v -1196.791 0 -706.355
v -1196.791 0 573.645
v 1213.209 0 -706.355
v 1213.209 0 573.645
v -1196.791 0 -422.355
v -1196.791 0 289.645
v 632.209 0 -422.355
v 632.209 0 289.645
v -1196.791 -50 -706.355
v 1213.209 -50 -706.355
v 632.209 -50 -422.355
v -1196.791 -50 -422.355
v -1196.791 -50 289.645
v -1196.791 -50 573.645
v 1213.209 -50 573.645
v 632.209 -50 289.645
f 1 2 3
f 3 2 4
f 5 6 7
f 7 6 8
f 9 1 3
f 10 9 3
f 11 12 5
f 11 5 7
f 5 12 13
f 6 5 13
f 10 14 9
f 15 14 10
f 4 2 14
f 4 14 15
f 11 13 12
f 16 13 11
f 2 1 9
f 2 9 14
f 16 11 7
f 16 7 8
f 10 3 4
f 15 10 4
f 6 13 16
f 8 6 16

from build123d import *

# Parameters (mm, degrees)
F0_W     = 2410
F0_H     = 1280
F1_DEPTH = 50
F2_W     = 1829
F2_H     = 712
F3_DEPTH = 50


with BuildPart() as f1:
    # F0 (on Front) → F1 (new body)
    with BuildSketch(Plane.XZ):
        with Locations((8.208759, -66.355239)):
            Rectangle(F0_W, F0_H)
    extrude(amount=F1_DEPTH)


with BuildPart() as f3:
    # F2 (on face) → F3 (new body)
    with BuildSketch(Plane.XZ.offset(50)):
        with Locations((-282.291241, -66.355239)):
            Rectangle(F2_W, F2_H)
    extrude(amount=-F3_DEPTH)


solid = Compound([f1.part, f3.part])
